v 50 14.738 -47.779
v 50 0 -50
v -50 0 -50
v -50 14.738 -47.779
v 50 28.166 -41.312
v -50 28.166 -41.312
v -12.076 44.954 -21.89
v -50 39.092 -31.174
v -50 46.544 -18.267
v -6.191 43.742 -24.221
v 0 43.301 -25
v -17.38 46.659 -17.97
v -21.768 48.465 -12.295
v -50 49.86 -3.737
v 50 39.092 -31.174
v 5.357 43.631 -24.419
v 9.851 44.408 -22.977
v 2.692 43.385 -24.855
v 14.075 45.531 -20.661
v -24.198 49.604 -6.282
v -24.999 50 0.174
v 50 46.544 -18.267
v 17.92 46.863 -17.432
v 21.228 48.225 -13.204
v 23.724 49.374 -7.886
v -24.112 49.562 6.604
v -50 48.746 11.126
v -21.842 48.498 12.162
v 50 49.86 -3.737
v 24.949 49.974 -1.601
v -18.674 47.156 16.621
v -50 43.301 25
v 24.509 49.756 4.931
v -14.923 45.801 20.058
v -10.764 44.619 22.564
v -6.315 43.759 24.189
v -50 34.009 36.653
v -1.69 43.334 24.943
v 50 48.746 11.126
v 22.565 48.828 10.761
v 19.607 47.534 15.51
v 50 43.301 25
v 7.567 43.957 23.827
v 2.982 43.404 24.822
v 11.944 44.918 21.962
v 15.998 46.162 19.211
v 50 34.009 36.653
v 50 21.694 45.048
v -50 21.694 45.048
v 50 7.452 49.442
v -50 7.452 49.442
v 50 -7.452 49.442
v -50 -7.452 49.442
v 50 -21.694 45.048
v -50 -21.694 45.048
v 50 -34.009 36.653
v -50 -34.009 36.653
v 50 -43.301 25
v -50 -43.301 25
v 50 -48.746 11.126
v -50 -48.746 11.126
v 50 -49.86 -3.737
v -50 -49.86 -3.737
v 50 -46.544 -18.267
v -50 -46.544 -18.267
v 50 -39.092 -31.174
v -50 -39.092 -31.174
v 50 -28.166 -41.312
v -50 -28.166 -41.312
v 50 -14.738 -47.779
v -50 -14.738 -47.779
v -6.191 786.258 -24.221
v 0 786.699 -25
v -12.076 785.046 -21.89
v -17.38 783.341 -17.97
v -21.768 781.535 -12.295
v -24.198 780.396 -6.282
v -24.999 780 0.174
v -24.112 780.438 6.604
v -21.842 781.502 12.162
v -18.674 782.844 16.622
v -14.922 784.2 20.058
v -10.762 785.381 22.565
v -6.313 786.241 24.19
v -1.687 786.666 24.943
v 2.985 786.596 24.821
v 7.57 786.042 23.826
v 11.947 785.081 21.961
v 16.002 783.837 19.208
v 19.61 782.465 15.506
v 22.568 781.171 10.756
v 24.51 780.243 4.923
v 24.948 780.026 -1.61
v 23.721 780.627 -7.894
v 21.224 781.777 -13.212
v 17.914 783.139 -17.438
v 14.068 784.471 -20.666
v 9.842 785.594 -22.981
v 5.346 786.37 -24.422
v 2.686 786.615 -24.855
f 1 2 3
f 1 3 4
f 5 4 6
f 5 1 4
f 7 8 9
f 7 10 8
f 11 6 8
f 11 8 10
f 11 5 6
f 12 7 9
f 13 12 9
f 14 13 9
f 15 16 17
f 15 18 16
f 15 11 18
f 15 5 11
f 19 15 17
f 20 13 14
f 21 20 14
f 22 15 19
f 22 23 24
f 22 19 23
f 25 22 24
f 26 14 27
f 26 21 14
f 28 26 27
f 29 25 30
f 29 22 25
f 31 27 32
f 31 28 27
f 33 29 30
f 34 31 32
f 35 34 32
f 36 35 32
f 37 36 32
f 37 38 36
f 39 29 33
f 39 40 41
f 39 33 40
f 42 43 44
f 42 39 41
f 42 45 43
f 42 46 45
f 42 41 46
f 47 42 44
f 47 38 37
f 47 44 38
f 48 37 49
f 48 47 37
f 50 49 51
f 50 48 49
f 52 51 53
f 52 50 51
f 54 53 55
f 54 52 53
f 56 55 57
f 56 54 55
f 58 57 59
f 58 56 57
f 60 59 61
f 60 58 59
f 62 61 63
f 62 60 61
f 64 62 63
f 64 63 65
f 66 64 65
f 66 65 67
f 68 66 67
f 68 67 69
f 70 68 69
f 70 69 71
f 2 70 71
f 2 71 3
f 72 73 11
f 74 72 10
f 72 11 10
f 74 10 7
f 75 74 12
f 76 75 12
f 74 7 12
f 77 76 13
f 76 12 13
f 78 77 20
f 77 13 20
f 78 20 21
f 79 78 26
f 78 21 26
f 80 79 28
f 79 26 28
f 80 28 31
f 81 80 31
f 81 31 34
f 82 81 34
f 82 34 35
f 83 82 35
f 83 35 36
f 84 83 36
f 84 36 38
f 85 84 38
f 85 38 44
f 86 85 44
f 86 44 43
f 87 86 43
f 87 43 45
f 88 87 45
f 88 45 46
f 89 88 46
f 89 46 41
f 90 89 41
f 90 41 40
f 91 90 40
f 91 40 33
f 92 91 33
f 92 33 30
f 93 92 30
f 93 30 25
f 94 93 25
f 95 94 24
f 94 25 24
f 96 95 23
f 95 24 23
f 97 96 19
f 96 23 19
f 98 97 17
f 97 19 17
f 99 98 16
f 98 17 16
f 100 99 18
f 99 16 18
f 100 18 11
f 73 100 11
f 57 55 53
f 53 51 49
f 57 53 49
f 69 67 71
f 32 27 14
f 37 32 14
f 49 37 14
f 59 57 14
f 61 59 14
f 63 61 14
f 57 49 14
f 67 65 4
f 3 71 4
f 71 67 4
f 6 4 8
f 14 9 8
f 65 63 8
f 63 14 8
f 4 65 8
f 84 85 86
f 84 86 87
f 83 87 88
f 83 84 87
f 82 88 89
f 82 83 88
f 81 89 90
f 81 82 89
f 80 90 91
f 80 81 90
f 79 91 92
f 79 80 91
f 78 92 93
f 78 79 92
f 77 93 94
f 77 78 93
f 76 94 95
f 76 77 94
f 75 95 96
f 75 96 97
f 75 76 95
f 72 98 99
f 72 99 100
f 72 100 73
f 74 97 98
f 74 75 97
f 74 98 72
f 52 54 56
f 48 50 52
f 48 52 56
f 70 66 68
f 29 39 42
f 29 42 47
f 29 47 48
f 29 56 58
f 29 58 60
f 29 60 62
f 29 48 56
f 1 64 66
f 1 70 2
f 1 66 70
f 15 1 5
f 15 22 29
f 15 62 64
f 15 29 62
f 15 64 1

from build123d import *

# Parameters (mm, degrees)
CROQUIS1_R                 = 50
SALIENTE_EXTRUIR1_DEPTH    = 50
CROQUIS2_R                 = 25
SALIENTE_EXTRUIR2_DEPTH    = 800
CORTAR_EXTRUIR1_DEPTH      = 804.118920323
CORTAR_EXTRUIR1_DEPTH_BACK = 804.118920323
CROQUIS3_R                 = 50


with BuildPart() as part:
    # Croquis1 → Saliente-Extruir1 (new, symmetric)
    with BuildSketch(Plane(origin=(0, 0, 0), x_dir=(0, 0, -1), z_dir=(1, 0, 0))):
        Circle(CROQUIS1_R)
    extrude(amount=SALIENTE_EXTRUIR1_DEPTH, both=True)

    # Croquis2 → Saliente-Extruir2 (add)
    with BuildSketch(Plane(origin=(0, 0, 0), x_dir=(1, 0, 0), z_dir=(0, 1, 0))):
        with Locations(Location((0, 0, 0), (0, 0, 90))):
            Circle(CROQUIS2_R)
    extrude(amount=SALIENTE_EXTRUIR2_DEPTH)

    # Croquis3 → Cortar-Extruir1 (cut, two sides: drawn at the far end of the back side and taken through both)
    with BuildSketch(Plane(origin=(0, 0, 0), x_dir=(0, 0, -1), z_dir=(1, 0, 0)).offset(-CORTAR_EXTRUIR1_DEPTH_BACK)):
        with Locations((0, 830)):
            Circle(CROQUIS3_R)
    extrude(amount=CORTAR_EXTRUIR1_DEPTH + CORTAR_EXTRUIR1_DEPTH_BACK, mode=Mode.SUBTRACT)


solid = part.part
